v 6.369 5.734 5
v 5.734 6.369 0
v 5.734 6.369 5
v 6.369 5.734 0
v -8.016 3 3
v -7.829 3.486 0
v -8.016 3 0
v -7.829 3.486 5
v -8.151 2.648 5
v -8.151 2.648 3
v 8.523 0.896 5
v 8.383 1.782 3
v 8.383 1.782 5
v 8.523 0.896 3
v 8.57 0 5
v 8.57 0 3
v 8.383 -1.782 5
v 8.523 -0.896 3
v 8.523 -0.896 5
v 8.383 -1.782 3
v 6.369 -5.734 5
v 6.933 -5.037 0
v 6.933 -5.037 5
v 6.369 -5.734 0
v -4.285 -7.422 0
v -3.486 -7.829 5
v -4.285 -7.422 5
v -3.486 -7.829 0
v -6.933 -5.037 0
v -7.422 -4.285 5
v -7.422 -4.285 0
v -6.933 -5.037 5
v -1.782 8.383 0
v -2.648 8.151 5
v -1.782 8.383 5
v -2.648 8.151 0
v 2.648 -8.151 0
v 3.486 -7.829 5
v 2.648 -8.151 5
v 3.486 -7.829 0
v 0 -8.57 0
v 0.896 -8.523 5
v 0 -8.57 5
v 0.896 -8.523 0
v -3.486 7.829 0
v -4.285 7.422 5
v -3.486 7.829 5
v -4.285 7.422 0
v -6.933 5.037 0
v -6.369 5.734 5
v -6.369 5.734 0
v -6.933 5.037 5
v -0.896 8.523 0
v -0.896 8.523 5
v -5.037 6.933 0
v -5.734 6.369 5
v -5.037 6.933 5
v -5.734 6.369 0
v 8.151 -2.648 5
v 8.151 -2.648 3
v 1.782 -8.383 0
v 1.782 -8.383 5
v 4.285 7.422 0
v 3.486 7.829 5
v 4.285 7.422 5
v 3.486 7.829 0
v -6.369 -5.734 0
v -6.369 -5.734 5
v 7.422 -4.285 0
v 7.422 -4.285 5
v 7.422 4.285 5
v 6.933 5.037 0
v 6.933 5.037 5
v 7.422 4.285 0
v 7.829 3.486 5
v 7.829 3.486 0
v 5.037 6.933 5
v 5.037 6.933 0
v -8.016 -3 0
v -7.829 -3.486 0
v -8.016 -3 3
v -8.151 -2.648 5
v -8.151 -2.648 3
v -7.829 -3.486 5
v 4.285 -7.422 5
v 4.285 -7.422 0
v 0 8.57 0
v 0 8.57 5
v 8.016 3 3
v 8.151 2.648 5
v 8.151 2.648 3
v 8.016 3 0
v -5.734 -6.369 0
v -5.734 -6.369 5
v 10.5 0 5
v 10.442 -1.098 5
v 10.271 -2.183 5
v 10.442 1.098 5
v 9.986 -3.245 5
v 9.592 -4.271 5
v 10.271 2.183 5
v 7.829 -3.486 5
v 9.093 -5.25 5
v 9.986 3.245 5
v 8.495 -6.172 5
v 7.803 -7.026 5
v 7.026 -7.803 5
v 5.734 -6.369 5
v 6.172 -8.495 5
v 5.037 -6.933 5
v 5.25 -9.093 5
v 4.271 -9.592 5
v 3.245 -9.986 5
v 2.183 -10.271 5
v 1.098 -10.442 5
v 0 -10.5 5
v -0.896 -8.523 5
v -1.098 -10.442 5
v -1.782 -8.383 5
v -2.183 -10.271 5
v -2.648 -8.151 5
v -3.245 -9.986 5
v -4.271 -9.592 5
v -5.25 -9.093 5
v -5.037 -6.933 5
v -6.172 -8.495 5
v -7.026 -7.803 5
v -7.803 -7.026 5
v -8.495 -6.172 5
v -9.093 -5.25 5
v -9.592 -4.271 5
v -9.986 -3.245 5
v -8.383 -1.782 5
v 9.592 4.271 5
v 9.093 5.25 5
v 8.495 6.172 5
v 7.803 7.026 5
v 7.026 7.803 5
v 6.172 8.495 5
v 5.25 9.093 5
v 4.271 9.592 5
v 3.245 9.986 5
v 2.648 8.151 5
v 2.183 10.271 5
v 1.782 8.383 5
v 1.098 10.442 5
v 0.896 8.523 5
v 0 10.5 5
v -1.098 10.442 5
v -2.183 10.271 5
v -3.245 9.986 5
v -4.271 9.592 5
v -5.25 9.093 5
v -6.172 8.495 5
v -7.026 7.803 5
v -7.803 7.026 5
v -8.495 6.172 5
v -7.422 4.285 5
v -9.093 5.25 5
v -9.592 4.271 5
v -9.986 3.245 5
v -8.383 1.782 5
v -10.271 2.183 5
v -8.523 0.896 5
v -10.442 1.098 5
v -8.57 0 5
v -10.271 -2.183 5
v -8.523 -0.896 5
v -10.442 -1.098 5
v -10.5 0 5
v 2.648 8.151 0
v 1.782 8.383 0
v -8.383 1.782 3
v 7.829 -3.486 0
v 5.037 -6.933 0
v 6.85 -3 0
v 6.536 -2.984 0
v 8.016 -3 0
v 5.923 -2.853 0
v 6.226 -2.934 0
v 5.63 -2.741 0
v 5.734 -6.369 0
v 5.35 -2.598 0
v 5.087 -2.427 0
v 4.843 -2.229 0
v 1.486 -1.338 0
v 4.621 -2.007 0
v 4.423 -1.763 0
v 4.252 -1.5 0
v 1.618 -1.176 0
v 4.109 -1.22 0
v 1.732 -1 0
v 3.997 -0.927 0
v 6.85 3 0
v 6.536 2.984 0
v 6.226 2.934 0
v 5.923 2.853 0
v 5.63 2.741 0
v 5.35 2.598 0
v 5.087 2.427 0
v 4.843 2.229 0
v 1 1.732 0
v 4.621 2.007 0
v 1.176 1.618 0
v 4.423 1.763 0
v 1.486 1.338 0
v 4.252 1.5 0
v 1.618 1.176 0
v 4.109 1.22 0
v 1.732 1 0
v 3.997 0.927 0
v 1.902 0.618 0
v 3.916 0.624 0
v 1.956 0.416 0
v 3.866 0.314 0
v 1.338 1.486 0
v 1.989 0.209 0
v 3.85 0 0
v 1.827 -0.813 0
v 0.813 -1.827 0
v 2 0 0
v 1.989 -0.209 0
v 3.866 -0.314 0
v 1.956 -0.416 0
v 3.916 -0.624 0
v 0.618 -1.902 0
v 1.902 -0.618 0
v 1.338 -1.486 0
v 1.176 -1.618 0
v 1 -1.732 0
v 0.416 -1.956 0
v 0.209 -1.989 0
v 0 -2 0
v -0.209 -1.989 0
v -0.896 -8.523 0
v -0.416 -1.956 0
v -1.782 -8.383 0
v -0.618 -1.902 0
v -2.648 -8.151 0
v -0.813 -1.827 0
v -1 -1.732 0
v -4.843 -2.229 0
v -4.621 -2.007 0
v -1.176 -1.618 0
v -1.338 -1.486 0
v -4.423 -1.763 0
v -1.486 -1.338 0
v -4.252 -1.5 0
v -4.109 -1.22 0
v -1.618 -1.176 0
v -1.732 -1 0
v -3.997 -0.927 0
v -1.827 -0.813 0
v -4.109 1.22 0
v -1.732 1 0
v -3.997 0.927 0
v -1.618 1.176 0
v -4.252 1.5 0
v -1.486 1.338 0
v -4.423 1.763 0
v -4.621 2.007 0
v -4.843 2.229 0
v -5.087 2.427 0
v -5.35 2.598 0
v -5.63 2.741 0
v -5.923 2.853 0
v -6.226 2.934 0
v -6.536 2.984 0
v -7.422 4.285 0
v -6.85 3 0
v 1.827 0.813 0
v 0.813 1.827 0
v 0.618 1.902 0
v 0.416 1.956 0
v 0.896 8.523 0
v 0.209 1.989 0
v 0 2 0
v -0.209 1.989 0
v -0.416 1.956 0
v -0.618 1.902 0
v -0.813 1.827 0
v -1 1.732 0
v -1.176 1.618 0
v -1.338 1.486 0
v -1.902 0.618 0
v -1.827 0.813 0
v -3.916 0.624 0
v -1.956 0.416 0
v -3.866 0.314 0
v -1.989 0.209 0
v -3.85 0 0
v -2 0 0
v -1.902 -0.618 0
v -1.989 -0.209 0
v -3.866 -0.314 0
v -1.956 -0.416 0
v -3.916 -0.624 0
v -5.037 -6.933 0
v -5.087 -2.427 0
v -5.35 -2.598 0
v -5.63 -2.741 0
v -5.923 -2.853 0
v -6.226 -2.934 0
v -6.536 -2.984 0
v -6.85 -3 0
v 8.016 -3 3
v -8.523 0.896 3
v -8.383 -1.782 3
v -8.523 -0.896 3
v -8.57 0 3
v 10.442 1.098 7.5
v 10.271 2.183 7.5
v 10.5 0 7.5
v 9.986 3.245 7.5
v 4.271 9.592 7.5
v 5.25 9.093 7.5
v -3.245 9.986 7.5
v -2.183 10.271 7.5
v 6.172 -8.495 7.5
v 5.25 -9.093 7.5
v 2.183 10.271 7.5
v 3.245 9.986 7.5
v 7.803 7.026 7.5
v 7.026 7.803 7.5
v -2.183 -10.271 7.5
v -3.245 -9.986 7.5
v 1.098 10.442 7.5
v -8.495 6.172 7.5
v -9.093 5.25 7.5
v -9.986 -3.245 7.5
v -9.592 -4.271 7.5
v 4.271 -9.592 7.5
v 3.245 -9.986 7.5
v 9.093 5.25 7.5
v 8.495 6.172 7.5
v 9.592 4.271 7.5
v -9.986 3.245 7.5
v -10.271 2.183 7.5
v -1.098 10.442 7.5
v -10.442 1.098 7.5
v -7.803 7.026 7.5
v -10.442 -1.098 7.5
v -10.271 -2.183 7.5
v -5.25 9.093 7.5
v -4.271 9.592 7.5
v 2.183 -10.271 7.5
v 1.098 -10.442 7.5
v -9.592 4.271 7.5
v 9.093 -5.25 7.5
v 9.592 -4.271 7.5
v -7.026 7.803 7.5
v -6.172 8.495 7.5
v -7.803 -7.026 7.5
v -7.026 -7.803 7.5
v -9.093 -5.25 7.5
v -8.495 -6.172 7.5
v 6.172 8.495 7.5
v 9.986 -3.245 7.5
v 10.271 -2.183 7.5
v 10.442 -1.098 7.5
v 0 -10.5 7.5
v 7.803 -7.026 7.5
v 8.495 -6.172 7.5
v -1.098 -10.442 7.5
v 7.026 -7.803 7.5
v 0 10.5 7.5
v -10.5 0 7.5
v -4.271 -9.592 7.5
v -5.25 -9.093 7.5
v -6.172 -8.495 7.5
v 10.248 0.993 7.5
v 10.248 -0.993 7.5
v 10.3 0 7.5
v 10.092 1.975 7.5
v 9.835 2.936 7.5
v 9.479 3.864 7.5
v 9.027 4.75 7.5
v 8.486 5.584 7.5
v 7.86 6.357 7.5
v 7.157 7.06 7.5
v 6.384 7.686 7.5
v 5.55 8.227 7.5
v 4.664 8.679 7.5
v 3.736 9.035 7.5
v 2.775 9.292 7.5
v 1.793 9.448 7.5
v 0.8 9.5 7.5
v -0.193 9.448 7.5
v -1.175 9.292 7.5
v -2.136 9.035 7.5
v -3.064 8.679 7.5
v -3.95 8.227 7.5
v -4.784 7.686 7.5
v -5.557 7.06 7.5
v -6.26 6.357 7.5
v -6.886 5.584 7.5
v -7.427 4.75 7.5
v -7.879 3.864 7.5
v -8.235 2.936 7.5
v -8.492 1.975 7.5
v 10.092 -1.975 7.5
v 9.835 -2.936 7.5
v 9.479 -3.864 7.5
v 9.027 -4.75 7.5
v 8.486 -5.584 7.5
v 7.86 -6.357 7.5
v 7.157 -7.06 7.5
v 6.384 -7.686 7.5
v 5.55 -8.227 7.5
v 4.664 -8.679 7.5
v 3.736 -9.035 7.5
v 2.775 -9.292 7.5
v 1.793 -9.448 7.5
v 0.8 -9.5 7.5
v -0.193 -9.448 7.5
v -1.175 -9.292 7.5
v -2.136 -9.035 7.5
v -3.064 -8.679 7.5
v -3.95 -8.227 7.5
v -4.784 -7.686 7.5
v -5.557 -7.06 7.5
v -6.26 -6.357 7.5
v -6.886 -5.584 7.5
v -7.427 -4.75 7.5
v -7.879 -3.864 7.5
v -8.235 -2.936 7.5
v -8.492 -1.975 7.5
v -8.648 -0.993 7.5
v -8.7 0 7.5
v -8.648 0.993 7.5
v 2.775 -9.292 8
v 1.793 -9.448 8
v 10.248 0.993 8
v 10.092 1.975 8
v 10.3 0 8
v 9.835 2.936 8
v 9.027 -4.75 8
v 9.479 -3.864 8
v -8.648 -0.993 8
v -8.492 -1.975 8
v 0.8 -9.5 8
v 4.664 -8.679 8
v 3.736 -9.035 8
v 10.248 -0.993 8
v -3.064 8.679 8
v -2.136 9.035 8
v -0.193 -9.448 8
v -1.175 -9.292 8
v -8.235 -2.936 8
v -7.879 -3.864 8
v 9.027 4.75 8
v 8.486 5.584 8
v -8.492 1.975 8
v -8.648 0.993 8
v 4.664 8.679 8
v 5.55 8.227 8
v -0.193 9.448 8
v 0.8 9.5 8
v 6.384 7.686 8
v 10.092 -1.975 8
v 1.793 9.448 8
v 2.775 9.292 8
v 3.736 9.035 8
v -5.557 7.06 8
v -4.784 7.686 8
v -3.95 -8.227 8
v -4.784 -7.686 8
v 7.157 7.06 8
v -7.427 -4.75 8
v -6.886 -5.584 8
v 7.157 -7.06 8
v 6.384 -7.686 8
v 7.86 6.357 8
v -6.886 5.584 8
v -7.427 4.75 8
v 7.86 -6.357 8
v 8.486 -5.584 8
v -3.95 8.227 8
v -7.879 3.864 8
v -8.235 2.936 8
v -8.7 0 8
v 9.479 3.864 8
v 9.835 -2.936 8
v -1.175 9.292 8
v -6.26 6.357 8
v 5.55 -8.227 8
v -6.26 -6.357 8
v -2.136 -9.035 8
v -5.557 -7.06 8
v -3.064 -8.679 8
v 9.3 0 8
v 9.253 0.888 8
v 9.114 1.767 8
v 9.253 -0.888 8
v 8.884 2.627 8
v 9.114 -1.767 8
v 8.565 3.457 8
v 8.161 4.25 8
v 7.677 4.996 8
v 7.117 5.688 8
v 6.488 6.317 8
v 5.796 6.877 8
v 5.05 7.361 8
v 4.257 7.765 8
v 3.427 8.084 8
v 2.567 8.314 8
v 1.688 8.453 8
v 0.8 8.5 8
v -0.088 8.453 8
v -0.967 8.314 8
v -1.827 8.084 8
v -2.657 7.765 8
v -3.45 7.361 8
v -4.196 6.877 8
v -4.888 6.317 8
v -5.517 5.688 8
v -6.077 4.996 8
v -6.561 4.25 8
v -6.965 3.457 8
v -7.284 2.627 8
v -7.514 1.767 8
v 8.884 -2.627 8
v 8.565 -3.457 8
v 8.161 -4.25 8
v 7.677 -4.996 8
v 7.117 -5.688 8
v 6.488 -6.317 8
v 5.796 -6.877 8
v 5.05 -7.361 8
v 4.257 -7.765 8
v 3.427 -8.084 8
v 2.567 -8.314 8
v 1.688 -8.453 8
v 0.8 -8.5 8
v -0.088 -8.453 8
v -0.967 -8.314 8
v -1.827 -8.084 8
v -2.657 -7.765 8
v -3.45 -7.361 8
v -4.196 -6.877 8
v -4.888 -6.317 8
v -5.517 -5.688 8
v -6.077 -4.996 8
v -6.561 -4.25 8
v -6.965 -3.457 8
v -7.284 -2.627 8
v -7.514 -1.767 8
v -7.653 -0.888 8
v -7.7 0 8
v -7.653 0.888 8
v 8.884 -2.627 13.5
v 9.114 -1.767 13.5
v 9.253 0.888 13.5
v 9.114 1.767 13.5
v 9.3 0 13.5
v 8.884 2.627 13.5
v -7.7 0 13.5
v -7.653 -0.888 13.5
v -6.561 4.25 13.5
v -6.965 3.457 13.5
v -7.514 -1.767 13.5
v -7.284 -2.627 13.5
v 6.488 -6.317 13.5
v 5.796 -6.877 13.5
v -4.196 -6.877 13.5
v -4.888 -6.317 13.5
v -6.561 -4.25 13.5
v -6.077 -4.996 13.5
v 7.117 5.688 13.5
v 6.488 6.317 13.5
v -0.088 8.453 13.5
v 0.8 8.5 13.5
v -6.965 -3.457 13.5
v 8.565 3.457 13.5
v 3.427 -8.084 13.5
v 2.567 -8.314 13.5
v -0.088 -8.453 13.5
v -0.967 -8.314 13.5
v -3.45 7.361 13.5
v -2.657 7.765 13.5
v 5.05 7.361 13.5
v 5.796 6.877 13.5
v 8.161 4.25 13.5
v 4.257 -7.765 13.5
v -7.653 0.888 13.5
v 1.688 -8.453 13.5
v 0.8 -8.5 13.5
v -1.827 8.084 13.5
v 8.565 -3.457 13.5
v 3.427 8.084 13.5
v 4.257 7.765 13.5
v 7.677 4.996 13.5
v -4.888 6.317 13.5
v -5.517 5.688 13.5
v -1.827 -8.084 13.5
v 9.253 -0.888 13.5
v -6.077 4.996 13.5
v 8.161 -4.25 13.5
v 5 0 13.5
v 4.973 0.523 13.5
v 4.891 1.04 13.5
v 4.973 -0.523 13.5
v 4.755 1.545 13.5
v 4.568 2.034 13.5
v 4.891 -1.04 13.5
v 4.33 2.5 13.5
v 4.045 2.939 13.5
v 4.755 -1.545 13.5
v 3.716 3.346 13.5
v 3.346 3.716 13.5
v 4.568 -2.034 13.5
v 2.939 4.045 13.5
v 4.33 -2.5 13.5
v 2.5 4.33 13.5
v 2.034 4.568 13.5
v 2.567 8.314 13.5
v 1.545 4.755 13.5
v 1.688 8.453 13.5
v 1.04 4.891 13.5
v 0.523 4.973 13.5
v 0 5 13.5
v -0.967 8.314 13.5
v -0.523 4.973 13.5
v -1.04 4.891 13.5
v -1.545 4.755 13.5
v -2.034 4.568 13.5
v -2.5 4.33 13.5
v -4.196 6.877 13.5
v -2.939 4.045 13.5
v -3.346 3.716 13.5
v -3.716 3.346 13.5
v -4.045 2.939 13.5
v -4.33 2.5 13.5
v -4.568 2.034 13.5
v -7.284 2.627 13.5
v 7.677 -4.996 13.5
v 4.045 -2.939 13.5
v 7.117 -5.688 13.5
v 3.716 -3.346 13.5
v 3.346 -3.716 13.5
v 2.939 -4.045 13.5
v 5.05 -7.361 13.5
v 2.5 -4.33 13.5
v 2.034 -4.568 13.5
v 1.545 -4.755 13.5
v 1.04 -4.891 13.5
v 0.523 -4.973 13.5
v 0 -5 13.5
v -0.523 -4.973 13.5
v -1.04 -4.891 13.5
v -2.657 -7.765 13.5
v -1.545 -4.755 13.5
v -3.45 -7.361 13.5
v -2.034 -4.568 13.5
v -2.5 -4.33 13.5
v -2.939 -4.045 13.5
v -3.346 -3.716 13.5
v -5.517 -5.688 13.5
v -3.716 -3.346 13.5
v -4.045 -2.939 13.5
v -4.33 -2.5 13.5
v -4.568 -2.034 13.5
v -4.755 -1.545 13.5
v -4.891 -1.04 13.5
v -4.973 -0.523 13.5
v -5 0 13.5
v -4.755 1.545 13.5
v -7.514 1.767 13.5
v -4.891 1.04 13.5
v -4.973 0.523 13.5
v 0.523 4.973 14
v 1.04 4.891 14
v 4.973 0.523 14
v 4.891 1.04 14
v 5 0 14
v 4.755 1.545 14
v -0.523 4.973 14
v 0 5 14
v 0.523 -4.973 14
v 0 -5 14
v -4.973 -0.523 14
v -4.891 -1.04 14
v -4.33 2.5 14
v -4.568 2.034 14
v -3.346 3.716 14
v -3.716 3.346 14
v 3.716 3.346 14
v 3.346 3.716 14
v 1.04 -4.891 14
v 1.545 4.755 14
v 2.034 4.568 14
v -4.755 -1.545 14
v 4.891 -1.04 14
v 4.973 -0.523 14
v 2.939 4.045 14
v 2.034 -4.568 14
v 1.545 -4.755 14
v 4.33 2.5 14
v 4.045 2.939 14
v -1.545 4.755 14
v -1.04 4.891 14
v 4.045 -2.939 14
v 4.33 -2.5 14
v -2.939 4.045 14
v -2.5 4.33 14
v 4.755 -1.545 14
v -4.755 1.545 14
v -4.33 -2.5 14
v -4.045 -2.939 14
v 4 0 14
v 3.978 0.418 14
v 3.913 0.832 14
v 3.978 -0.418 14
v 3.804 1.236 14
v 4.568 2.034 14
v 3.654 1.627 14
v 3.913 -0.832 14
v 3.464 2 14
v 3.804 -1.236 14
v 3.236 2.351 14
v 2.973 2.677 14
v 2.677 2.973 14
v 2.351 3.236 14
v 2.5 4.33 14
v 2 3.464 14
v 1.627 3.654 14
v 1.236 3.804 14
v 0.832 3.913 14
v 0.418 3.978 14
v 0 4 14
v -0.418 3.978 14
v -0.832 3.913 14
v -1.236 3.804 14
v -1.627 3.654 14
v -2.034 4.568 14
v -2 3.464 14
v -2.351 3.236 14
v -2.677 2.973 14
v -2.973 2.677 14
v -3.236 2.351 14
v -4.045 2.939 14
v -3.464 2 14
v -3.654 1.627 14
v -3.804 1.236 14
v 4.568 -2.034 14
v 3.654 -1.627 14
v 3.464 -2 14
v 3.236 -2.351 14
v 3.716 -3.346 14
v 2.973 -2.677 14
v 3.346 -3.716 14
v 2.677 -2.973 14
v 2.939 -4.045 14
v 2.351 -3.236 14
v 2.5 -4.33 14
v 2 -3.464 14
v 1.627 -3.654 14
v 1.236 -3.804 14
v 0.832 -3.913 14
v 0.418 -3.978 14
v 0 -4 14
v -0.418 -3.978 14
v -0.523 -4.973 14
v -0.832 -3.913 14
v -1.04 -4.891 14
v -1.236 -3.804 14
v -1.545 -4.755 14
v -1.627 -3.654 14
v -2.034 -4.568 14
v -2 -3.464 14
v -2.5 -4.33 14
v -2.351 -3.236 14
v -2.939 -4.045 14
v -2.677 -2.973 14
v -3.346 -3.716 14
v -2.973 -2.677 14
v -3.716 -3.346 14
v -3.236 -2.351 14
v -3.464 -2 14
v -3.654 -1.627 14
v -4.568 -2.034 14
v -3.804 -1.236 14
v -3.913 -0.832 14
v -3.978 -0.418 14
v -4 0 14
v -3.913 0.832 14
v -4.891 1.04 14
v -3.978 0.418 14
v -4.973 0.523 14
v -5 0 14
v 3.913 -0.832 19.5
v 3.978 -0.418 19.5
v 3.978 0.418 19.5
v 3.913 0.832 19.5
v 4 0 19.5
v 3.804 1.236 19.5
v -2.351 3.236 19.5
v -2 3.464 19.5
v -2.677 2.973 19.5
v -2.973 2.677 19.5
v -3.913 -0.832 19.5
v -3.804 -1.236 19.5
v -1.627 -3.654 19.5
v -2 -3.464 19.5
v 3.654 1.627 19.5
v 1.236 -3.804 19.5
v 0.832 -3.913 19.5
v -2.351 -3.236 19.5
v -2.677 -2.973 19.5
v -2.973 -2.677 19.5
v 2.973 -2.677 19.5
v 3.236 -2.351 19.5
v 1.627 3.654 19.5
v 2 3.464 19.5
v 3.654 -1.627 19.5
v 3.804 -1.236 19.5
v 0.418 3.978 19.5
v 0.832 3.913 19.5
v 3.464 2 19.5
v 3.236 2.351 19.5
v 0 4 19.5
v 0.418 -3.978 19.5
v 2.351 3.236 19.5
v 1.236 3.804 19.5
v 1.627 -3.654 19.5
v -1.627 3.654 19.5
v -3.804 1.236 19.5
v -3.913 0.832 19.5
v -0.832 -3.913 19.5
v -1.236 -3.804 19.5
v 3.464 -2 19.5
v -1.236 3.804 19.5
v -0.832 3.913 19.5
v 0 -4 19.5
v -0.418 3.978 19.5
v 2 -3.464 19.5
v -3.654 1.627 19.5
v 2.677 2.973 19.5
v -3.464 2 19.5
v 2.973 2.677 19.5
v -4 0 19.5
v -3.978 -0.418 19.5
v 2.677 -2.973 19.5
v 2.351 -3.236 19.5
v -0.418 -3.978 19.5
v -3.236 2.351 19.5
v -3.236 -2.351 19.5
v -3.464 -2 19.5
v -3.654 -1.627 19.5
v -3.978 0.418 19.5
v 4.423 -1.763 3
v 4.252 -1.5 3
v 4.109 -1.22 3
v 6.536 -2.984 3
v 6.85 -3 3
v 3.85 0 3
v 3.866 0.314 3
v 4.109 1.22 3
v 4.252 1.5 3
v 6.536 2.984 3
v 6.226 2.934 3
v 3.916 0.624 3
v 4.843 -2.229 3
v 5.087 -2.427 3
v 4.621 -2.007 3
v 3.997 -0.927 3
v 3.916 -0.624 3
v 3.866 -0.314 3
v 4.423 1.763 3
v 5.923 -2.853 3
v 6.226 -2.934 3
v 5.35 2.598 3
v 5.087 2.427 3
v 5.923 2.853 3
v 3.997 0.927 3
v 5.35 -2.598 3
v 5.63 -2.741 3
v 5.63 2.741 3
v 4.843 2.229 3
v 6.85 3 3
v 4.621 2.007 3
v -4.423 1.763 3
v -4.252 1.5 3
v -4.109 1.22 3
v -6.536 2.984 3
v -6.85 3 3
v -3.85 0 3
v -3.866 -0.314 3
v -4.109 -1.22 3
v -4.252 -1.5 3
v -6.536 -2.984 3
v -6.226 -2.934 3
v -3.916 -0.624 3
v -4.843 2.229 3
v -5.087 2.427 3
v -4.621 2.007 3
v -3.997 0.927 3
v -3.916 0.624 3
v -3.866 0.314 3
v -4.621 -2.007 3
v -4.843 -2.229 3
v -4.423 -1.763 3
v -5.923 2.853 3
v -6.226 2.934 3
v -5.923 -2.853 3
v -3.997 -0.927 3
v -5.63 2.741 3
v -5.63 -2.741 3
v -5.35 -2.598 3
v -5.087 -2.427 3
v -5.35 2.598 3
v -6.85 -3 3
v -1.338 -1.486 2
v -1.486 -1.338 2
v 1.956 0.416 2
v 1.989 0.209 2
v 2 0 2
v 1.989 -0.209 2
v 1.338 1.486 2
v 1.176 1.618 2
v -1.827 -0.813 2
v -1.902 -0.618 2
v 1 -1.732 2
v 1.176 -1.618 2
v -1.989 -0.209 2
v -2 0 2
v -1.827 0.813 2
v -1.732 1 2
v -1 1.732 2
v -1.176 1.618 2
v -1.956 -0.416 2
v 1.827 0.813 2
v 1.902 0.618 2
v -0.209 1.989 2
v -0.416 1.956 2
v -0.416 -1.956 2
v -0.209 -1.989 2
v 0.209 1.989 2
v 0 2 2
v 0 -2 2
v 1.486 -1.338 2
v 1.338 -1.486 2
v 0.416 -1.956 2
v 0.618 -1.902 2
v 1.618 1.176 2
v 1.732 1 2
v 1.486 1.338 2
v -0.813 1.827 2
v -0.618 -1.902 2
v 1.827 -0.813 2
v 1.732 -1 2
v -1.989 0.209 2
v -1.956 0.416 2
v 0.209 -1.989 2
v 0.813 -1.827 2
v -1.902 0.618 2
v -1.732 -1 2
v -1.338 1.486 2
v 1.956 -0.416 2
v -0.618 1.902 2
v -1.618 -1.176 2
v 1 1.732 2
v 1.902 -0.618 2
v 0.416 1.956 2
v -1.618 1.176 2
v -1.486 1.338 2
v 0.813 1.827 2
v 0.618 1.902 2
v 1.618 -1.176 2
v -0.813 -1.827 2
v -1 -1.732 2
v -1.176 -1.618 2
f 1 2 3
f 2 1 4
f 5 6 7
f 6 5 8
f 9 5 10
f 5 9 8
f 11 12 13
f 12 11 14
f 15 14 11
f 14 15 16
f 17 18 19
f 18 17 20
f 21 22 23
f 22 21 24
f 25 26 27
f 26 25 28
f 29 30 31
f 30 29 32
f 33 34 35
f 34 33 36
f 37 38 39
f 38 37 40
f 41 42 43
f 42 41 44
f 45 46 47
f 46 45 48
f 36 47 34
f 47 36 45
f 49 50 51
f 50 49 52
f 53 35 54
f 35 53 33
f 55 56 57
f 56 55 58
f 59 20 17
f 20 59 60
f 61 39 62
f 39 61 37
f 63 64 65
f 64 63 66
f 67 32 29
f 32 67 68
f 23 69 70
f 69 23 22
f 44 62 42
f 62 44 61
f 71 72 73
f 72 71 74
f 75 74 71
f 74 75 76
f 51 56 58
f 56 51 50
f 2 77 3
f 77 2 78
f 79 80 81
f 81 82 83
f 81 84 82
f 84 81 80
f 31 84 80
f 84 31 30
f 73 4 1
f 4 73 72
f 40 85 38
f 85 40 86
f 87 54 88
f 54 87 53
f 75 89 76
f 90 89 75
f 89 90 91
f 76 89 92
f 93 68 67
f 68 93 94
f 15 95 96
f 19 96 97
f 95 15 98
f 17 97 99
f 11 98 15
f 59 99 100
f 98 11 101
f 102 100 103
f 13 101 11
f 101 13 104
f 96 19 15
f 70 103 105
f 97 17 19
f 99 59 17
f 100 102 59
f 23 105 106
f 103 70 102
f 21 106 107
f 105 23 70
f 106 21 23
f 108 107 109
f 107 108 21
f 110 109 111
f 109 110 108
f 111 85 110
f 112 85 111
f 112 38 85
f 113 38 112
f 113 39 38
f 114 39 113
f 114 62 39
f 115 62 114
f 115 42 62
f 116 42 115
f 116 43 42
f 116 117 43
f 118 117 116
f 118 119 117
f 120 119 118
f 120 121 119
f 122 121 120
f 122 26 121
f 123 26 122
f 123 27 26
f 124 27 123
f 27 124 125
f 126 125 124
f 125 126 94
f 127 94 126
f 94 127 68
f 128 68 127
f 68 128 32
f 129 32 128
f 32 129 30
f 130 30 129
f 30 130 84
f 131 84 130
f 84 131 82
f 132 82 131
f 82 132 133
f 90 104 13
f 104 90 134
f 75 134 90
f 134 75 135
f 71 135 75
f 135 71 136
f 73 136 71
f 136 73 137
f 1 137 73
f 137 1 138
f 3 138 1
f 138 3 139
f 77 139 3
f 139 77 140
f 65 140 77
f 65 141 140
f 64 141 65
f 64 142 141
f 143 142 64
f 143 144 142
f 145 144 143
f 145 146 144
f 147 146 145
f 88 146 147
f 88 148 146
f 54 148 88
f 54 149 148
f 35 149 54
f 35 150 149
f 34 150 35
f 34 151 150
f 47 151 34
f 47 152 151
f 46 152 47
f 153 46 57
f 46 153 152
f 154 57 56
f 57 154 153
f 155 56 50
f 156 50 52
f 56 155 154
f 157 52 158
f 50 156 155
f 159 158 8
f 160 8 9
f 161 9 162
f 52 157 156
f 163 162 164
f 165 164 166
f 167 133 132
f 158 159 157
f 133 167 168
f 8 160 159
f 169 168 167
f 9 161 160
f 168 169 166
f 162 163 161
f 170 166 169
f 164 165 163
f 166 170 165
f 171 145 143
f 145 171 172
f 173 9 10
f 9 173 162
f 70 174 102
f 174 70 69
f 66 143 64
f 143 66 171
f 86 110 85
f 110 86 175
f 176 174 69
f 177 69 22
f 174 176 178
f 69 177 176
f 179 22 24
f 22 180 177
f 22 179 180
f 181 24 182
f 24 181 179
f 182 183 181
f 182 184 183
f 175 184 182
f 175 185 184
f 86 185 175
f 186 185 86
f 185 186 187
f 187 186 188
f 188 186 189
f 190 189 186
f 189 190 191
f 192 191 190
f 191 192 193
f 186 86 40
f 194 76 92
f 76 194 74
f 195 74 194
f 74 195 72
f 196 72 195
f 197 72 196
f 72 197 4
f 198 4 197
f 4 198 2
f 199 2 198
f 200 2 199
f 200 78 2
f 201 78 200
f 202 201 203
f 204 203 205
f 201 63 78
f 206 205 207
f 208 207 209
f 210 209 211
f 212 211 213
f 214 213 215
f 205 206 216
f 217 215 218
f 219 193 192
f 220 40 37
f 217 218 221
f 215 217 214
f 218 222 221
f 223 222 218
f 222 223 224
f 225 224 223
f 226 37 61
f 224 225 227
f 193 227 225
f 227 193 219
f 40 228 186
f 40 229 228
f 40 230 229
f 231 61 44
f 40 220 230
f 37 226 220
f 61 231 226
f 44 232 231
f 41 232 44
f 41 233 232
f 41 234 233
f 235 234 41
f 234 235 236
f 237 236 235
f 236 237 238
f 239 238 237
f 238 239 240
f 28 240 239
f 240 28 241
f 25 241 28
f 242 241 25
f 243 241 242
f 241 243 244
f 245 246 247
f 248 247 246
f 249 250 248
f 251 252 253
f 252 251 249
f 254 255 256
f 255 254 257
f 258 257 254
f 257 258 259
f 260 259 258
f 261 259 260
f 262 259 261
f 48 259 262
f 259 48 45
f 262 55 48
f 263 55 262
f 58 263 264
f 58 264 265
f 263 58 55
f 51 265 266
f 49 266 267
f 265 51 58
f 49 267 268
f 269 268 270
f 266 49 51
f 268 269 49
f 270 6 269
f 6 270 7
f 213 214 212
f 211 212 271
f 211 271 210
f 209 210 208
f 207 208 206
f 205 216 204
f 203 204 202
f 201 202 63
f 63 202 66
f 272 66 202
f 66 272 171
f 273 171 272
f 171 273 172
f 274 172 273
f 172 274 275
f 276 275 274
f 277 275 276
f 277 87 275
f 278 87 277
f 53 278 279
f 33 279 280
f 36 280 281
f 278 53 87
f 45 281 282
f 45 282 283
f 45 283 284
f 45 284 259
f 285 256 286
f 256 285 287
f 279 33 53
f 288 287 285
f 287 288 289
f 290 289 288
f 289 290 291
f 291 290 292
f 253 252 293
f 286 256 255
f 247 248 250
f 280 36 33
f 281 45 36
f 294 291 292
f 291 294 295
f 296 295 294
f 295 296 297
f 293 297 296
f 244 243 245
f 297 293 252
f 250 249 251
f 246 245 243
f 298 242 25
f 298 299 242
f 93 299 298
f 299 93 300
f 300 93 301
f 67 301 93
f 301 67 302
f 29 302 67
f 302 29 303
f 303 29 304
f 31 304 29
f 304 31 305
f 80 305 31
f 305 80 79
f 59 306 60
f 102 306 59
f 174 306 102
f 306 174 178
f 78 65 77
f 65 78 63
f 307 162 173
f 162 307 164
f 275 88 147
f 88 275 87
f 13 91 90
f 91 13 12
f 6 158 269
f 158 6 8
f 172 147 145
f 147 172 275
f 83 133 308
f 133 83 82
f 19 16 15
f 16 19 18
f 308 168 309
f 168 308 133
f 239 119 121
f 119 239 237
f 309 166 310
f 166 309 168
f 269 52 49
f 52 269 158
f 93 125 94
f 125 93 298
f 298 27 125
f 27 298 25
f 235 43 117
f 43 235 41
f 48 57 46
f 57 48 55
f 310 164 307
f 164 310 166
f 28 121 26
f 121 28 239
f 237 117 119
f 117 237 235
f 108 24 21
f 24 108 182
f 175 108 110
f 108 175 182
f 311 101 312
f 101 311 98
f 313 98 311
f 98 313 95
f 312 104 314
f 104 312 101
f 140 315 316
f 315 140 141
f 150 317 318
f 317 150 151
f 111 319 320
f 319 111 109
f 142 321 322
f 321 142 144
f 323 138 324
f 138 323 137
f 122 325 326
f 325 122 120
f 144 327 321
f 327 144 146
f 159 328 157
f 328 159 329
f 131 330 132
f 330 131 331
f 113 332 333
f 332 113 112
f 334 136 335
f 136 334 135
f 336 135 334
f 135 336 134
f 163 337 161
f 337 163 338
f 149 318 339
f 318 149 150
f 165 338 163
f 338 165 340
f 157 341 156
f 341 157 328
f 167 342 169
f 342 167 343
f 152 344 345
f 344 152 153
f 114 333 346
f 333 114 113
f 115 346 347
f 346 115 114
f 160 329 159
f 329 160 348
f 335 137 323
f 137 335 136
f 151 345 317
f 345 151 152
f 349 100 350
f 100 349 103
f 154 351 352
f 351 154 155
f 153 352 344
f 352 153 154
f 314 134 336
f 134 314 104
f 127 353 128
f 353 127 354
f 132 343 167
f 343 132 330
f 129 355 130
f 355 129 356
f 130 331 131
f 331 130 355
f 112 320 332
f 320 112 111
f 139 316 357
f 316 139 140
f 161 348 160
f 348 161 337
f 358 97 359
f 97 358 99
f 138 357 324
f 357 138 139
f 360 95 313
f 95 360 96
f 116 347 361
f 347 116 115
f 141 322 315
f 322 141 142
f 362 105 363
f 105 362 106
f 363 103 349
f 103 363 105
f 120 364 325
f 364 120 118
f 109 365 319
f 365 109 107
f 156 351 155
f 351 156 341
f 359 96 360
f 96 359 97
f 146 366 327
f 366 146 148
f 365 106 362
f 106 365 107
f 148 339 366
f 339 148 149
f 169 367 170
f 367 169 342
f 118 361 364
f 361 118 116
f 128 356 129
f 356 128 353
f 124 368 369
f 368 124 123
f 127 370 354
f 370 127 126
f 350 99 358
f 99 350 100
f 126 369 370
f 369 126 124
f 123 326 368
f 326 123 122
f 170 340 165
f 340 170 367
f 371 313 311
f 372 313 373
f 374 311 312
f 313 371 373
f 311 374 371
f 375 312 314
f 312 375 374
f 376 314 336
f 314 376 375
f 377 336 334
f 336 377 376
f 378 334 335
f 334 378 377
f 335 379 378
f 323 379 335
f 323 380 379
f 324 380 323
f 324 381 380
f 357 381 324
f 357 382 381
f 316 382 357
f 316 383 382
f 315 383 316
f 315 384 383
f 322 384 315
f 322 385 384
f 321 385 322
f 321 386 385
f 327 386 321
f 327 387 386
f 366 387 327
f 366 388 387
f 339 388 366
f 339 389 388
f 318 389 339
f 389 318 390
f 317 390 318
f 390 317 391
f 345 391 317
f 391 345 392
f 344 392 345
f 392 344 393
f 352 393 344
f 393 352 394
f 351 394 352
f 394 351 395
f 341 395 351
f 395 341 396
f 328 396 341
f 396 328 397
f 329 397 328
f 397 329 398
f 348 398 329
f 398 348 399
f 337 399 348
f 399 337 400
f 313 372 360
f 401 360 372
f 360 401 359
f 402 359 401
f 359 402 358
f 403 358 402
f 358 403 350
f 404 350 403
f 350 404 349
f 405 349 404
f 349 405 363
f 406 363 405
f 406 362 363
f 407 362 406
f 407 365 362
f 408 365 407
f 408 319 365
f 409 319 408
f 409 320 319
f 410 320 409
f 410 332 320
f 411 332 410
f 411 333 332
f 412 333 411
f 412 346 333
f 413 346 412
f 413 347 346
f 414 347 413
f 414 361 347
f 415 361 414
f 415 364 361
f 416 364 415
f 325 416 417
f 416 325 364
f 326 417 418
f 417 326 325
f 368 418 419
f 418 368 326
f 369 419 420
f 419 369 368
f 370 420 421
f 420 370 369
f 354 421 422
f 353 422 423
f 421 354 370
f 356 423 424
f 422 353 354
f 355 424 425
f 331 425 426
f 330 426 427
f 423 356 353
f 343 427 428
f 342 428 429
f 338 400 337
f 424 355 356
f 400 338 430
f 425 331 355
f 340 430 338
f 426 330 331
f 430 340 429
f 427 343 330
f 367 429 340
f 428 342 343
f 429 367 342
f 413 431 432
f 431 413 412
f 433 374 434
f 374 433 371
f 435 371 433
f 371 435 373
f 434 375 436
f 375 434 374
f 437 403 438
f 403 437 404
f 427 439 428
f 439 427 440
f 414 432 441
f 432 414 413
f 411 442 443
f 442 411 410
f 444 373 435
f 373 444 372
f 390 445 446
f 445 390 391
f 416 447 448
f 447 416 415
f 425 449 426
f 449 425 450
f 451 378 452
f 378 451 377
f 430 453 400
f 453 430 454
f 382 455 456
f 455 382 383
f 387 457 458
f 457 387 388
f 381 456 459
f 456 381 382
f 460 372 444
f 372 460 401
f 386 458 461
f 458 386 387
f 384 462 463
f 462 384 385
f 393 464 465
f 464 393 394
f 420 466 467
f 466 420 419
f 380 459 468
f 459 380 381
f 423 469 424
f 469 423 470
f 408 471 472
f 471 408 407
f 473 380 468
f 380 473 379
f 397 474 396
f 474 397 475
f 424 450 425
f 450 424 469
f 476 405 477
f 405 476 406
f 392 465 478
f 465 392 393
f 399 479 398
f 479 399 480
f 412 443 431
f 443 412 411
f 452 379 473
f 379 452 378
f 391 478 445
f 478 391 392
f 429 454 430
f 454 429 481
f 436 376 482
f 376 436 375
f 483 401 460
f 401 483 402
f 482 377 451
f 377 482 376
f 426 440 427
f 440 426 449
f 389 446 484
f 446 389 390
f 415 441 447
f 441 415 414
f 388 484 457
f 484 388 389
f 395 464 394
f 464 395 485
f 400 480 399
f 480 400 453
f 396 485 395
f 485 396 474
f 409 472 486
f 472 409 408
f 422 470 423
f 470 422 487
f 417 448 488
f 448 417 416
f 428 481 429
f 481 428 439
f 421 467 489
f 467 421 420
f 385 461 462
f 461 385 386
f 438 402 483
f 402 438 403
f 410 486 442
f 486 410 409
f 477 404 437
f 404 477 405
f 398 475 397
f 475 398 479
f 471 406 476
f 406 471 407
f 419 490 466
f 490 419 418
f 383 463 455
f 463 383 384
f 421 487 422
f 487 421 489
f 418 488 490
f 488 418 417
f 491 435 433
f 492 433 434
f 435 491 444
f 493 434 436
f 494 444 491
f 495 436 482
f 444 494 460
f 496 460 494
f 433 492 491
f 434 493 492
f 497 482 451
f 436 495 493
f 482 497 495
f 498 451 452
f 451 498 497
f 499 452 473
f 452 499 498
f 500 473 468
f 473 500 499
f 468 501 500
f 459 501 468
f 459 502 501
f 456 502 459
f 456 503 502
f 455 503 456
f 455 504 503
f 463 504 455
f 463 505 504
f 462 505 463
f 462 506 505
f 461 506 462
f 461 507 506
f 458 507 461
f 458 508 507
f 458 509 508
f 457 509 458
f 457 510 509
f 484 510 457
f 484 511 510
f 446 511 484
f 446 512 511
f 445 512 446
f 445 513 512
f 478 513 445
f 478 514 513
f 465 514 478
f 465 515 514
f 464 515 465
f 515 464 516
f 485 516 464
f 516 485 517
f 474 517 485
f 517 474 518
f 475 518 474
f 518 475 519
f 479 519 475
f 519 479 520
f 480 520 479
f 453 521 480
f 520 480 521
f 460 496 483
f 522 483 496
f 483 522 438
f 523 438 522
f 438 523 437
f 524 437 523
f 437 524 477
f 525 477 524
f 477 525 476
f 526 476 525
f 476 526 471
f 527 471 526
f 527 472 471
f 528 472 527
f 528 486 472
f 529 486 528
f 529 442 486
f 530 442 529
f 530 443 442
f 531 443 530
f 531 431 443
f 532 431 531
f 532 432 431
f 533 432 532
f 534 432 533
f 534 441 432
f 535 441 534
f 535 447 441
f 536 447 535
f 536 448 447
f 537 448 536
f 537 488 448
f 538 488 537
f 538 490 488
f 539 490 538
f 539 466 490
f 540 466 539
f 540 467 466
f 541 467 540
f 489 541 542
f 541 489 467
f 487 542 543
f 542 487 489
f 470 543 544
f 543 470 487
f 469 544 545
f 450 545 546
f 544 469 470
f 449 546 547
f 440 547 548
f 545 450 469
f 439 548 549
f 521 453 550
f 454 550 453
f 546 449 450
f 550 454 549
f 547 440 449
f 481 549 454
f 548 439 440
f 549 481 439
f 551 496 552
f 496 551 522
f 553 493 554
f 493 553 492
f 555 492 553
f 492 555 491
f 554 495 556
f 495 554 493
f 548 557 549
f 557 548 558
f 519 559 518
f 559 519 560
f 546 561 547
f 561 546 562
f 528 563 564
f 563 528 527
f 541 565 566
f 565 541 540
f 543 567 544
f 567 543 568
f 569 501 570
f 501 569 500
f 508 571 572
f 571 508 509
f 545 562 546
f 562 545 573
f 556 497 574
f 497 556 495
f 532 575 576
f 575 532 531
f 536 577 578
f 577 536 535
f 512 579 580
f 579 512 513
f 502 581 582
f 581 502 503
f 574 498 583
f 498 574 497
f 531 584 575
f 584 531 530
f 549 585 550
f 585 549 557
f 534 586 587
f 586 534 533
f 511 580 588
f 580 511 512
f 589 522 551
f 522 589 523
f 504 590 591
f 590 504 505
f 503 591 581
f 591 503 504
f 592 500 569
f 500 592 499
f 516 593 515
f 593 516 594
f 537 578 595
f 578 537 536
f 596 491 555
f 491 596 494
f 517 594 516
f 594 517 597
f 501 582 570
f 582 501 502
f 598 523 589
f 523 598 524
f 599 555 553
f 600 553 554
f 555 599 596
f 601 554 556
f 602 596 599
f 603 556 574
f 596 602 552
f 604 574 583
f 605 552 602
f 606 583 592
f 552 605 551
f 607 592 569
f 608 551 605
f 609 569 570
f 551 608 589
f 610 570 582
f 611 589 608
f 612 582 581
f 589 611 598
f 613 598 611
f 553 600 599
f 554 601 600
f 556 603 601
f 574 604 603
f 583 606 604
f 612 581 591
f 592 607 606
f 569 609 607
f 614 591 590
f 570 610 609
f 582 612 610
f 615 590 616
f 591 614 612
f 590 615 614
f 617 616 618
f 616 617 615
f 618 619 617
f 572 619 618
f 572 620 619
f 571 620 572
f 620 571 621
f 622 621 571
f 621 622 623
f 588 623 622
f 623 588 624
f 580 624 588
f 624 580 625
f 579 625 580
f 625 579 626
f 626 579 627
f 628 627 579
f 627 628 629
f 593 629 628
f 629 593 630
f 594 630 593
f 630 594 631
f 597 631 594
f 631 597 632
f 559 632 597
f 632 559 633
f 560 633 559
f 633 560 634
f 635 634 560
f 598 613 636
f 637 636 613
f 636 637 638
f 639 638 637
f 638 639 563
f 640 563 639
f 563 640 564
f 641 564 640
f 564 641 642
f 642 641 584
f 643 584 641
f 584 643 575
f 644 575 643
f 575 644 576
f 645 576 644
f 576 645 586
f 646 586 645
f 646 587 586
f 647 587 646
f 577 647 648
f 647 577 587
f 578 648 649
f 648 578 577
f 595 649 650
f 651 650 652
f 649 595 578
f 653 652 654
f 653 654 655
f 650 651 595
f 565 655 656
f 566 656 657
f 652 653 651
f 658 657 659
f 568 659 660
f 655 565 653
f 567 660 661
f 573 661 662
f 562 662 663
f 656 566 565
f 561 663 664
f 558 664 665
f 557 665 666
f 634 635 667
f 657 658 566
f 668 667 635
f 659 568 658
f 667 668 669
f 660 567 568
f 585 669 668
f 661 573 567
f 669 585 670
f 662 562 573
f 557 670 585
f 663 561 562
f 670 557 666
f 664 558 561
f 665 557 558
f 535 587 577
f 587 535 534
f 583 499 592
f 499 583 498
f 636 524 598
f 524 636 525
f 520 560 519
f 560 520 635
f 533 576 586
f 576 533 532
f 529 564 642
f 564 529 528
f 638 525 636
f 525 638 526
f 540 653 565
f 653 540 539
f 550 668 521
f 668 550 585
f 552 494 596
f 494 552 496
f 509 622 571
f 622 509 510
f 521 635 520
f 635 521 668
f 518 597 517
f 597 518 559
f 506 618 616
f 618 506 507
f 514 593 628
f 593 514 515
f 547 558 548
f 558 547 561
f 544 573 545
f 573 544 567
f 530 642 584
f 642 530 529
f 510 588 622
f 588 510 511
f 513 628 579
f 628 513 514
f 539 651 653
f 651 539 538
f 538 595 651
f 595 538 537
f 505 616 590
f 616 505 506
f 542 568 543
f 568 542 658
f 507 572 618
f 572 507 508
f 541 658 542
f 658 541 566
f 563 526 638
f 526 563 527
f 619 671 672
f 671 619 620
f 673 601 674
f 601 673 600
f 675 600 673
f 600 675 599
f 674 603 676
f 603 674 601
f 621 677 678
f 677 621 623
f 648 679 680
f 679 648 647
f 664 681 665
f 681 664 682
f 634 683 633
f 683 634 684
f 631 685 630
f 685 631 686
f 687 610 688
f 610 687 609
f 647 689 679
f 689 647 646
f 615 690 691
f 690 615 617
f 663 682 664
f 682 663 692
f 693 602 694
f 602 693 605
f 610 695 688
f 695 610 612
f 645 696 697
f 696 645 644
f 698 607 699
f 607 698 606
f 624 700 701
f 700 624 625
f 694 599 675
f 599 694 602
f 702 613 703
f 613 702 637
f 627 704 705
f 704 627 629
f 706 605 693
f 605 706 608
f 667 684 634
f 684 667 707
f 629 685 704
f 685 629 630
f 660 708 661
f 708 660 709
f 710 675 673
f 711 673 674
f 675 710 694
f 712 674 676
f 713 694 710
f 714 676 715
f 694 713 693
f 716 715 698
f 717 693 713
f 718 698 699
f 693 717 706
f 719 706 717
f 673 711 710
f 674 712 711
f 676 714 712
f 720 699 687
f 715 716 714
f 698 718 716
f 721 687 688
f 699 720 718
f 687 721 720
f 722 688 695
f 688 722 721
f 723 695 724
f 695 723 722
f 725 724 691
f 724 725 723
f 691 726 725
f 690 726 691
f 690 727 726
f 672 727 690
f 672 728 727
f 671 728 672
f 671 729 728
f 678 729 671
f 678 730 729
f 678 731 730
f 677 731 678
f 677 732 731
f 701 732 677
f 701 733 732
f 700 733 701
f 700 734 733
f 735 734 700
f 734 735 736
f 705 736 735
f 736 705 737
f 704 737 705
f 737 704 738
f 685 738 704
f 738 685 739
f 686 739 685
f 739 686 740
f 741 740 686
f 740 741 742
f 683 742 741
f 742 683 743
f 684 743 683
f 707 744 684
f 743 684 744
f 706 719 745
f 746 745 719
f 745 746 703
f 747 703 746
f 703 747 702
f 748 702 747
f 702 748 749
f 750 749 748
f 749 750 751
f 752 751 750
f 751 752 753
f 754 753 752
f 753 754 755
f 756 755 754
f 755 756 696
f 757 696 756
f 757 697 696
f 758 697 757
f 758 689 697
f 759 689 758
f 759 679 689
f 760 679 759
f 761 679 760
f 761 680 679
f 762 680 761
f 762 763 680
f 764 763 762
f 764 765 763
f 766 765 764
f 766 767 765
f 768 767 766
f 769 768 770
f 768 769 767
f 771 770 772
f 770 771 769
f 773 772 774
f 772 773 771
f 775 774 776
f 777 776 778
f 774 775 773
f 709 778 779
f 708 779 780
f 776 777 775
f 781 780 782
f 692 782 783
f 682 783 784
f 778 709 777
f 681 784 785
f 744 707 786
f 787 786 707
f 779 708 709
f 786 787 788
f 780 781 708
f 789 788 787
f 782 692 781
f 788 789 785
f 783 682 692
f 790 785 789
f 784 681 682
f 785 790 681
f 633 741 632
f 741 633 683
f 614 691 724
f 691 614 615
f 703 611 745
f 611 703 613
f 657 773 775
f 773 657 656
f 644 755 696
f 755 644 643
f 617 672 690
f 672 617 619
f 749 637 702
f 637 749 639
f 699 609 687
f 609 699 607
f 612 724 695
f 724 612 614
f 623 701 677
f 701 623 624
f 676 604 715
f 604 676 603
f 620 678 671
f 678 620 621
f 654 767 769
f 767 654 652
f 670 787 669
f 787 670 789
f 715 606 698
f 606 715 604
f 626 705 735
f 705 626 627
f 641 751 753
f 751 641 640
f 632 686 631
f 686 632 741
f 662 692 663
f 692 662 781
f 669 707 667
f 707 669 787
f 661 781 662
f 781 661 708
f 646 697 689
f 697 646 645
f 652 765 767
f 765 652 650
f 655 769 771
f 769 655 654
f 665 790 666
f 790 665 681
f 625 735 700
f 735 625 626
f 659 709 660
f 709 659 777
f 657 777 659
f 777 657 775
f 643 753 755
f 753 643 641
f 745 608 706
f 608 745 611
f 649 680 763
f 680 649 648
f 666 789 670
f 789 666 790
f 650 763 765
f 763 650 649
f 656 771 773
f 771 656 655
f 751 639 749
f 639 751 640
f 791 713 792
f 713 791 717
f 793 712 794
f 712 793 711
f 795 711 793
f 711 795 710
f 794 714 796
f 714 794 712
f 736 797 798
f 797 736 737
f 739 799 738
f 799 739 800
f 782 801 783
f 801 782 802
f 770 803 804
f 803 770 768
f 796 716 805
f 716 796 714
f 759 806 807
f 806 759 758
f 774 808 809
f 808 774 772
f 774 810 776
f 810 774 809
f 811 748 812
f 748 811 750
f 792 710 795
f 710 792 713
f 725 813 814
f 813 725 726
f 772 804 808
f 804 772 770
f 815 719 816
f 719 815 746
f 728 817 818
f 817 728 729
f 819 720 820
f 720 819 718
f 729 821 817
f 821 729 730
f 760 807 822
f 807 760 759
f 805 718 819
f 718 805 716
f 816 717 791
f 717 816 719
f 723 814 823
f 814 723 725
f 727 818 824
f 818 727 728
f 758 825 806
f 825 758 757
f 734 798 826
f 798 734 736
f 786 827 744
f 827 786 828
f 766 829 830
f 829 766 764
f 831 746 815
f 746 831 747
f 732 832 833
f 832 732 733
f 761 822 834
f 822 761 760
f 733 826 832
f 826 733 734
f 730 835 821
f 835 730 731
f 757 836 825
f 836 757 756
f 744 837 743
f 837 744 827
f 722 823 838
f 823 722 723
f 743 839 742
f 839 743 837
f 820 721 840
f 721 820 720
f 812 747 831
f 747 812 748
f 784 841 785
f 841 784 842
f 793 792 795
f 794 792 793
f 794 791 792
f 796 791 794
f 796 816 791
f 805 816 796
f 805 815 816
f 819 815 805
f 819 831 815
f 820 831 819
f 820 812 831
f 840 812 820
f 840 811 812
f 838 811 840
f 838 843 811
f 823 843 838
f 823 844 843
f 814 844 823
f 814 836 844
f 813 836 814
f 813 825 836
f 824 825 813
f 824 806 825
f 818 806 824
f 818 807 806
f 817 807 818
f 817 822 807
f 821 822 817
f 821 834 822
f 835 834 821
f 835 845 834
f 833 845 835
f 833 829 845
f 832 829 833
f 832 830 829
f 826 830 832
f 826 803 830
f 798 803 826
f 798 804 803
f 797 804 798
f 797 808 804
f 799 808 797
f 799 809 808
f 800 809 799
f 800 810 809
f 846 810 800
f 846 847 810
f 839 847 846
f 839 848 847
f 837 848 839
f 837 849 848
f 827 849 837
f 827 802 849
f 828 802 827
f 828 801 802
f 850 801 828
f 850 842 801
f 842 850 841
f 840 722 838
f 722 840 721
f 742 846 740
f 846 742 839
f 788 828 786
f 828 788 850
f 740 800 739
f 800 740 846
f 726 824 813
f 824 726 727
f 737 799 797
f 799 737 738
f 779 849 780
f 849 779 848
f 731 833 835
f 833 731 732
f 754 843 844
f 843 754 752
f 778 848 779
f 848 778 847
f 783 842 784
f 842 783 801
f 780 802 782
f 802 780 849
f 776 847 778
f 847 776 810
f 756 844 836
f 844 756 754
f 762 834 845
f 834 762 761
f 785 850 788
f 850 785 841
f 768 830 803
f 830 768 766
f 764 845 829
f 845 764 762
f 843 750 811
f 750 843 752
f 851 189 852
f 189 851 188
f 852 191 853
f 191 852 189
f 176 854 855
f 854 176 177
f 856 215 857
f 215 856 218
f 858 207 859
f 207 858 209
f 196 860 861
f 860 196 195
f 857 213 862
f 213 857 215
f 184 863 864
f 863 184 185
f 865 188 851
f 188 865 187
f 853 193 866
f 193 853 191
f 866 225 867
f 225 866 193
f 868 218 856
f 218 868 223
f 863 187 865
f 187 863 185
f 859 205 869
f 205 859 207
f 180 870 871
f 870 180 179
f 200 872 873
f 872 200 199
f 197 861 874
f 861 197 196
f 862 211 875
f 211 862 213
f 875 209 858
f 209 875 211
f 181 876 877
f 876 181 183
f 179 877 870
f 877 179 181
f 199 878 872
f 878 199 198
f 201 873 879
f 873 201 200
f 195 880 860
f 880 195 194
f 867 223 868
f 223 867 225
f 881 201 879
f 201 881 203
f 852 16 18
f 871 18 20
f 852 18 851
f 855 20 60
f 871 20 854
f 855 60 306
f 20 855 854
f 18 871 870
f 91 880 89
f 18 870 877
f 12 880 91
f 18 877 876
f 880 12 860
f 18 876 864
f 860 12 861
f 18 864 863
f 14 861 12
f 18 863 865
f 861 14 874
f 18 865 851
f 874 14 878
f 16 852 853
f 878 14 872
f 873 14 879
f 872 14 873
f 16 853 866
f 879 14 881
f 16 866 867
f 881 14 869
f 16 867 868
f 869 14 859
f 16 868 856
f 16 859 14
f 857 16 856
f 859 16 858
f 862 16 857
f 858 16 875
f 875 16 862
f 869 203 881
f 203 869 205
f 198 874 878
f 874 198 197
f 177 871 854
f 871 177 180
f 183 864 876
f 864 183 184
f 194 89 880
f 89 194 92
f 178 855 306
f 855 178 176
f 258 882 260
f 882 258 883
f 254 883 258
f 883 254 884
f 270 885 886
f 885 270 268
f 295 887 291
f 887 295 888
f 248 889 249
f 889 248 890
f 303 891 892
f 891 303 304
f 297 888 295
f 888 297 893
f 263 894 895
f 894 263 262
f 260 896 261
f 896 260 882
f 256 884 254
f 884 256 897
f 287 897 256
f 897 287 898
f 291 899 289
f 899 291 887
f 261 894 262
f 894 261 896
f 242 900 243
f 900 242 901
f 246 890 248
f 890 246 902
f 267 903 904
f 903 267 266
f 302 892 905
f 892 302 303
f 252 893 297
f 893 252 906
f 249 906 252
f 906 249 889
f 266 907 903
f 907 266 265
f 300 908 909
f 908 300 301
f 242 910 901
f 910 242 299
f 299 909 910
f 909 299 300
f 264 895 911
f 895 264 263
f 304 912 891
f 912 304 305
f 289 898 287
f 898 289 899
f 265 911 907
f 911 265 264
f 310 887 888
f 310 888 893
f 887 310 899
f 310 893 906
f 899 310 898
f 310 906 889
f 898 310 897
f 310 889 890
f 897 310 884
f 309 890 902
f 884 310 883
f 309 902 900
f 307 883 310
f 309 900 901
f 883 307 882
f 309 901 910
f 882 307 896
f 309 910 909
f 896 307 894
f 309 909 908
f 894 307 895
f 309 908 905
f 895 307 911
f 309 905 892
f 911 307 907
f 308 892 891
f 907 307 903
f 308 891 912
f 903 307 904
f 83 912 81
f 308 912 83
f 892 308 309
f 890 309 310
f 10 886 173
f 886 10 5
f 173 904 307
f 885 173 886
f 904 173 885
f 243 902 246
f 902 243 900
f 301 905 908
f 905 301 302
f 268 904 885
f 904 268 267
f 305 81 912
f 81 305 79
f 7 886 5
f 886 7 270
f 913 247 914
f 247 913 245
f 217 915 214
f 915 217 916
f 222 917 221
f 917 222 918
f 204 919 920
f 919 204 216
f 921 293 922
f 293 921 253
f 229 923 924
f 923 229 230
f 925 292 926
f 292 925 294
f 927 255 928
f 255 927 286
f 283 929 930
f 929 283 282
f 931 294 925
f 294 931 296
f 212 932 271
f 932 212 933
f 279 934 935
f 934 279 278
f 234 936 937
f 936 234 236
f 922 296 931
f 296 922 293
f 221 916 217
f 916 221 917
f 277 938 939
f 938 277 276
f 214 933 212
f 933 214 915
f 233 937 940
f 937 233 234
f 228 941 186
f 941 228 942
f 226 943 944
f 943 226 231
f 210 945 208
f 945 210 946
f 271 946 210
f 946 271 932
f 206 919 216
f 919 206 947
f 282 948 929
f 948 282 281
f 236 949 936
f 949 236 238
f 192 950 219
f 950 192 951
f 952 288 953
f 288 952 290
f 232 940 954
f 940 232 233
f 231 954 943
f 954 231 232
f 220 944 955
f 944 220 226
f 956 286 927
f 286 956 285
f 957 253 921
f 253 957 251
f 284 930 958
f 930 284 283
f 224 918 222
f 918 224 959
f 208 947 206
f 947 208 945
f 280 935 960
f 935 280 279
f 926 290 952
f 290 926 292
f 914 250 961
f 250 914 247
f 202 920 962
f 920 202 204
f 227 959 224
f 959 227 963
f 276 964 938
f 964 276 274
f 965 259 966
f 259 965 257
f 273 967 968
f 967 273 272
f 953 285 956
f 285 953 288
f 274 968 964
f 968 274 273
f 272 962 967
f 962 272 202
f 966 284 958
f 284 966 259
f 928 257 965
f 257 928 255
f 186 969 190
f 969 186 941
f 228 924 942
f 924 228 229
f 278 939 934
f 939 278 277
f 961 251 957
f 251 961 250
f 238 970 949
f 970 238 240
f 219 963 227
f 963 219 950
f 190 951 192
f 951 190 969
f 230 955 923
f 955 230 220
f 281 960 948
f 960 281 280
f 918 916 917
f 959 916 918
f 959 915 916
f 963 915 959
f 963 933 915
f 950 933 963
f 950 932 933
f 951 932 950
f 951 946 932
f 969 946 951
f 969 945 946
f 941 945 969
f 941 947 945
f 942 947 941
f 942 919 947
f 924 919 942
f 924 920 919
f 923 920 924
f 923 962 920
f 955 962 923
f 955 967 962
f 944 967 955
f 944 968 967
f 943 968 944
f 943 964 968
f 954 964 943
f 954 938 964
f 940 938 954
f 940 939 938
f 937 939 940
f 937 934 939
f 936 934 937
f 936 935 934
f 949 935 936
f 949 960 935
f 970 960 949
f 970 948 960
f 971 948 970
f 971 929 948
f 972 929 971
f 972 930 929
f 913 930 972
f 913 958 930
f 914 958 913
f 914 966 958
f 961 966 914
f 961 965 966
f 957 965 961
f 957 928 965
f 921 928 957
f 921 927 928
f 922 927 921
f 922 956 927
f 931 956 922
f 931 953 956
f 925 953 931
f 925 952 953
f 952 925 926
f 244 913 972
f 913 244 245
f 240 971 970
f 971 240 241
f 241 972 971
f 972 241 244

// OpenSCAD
// Вал эксцентрика. Open this file, F5 preview, F6 render, export STL.
use <reference_model.scad>
$fn=60;
eccentric_shaft();
